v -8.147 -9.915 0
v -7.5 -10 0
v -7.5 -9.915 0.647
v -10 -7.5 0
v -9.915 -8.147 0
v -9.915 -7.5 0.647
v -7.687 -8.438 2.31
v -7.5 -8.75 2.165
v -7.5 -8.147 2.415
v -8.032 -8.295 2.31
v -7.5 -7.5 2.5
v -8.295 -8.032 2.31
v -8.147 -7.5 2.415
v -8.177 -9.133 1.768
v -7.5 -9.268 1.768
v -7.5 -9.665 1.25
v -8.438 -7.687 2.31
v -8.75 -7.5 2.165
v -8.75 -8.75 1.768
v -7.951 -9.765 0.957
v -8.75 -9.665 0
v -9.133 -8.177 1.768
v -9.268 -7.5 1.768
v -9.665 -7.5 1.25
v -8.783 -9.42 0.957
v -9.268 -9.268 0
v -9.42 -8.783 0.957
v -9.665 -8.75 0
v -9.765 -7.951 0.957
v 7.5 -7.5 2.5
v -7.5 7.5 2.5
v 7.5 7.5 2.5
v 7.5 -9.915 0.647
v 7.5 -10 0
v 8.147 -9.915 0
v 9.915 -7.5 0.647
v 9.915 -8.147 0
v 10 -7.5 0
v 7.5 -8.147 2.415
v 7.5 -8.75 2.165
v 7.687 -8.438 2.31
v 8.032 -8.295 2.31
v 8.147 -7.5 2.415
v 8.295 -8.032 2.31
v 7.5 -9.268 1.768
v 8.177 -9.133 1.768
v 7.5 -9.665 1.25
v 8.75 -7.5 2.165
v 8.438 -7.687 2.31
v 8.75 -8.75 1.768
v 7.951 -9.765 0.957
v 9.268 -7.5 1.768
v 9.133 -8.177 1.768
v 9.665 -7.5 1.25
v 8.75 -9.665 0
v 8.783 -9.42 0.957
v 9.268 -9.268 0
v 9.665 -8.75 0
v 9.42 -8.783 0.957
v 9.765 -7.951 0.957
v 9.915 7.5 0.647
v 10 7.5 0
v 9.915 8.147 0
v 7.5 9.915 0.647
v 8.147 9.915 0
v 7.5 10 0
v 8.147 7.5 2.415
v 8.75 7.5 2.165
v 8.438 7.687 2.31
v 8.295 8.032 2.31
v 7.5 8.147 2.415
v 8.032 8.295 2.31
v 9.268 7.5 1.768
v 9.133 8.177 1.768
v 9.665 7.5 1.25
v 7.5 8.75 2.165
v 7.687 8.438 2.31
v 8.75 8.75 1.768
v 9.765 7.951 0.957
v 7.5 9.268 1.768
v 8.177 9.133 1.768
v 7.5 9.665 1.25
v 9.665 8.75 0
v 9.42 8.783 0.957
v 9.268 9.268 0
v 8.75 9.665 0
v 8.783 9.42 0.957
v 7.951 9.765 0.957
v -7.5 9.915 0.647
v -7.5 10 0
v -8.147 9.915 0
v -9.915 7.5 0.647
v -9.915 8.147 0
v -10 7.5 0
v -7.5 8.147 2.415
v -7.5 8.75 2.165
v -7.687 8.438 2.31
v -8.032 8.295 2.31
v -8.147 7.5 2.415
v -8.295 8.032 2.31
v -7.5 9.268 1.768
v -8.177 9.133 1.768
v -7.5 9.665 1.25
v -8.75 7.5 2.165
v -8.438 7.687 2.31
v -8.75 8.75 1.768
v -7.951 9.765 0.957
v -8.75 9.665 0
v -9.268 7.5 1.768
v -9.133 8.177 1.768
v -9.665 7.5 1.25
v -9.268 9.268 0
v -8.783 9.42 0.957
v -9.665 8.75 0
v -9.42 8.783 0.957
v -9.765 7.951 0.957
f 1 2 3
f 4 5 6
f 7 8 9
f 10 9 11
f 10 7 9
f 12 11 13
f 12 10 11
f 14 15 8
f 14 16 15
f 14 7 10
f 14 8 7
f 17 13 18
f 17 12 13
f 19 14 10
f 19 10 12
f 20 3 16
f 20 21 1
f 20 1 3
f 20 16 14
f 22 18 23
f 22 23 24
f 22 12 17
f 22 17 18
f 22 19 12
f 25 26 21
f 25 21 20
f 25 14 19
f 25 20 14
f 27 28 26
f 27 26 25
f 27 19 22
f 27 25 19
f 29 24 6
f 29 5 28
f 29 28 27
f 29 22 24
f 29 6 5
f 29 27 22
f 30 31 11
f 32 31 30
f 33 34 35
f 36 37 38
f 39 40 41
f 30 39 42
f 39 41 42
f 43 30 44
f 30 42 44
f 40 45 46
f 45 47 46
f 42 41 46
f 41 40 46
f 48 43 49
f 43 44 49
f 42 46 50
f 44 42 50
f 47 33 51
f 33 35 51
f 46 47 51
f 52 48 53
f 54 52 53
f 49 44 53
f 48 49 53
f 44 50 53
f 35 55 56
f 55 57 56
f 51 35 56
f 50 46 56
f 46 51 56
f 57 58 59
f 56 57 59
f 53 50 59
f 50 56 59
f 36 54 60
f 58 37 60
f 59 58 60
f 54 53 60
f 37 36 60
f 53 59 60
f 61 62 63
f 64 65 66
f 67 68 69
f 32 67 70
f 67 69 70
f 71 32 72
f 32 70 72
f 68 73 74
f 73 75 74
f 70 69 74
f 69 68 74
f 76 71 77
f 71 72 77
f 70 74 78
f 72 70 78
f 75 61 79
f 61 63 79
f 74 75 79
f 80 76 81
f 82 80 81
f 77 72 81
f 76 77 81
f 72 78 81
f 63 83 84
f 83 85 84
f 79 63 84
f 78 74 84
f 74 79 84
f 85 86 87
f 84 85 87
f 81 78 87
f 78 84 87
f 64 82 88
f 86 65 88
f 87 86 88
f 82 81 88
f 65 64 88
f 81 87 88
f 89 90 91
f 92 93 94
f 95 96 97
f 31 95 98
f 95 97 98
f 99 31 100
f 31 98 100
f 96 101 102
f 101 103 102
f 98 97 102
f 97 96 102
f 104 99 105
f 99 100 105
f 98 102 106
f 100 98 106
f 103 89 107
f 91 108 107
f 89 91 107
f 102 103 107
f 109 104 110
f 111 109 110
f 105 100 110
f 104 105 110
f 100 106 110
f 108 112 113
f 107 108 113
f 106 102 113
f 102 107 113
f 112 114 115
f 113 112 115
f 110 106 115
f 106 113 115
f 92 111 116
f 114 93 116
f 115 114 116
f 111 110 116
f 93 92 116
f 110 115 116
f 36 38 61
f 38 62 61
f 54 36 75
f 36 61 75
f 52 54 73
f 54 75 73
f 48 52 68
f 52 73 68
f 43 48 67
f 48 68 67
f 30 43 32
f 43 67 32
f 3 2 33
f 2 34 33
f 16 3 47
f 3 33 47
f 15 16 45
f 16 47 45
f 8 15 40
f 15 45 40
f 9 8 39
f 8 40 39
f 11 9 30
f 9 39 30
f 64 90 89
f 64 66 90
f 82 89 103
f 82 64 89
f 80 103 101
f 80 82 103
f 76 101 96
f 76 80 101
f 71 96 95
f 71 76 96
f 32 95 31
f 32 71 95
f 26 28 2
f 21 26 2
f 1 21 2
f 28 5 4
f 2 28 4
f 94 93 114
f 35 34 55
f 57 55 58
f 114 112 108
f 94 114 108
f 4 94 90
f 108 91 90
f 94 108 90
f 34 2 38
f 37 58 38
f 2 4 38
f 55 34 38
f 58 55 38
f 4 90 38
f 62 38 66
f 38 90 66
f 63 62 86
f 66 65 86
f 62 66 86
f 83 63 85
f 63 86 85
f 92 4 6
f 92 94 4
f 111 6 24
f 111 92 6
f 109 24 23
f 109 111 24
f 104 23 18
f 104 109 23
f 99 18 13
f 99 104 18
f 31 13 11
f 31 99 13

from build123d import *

# Parameters (mm, degrees)
F0_W     = 20
F0_H     = 20
F1_DEPTH = 2.5
F2_R     = 2.49999


# Not quite as in the source:
# - a fillet or chamfer is up to 0.001 mm smaller than in the source, because OpenCascade refuses the exact size


with BuildPart() as f1:
    # F0 (on Top) → F1 (new body)
    with BuildSketch(Plane.XY):
        Rectangle(F0_W, F0_H)
    extrude(amount=F1_DEPTH)

    # F2 (radius 2.5 in the source; OpenCascade refuses exactly that, so slightly less here)
    f2_edges = [f1.edges().sort_by_distance(p)[0] for p in [
        (10, -10, 1.25),
        (10, 10, 1.25),
        (-10, -10, 1.25),
        (-10, 10, 1.25),
        (0, -10, 2.5),
        (10, 0, 2.5),
        (0, 10, 2.5),
        (-10, 0, 2.5),
    ]]
    fillet(f2_edges, radius=F2_R)


solid = f1.part
